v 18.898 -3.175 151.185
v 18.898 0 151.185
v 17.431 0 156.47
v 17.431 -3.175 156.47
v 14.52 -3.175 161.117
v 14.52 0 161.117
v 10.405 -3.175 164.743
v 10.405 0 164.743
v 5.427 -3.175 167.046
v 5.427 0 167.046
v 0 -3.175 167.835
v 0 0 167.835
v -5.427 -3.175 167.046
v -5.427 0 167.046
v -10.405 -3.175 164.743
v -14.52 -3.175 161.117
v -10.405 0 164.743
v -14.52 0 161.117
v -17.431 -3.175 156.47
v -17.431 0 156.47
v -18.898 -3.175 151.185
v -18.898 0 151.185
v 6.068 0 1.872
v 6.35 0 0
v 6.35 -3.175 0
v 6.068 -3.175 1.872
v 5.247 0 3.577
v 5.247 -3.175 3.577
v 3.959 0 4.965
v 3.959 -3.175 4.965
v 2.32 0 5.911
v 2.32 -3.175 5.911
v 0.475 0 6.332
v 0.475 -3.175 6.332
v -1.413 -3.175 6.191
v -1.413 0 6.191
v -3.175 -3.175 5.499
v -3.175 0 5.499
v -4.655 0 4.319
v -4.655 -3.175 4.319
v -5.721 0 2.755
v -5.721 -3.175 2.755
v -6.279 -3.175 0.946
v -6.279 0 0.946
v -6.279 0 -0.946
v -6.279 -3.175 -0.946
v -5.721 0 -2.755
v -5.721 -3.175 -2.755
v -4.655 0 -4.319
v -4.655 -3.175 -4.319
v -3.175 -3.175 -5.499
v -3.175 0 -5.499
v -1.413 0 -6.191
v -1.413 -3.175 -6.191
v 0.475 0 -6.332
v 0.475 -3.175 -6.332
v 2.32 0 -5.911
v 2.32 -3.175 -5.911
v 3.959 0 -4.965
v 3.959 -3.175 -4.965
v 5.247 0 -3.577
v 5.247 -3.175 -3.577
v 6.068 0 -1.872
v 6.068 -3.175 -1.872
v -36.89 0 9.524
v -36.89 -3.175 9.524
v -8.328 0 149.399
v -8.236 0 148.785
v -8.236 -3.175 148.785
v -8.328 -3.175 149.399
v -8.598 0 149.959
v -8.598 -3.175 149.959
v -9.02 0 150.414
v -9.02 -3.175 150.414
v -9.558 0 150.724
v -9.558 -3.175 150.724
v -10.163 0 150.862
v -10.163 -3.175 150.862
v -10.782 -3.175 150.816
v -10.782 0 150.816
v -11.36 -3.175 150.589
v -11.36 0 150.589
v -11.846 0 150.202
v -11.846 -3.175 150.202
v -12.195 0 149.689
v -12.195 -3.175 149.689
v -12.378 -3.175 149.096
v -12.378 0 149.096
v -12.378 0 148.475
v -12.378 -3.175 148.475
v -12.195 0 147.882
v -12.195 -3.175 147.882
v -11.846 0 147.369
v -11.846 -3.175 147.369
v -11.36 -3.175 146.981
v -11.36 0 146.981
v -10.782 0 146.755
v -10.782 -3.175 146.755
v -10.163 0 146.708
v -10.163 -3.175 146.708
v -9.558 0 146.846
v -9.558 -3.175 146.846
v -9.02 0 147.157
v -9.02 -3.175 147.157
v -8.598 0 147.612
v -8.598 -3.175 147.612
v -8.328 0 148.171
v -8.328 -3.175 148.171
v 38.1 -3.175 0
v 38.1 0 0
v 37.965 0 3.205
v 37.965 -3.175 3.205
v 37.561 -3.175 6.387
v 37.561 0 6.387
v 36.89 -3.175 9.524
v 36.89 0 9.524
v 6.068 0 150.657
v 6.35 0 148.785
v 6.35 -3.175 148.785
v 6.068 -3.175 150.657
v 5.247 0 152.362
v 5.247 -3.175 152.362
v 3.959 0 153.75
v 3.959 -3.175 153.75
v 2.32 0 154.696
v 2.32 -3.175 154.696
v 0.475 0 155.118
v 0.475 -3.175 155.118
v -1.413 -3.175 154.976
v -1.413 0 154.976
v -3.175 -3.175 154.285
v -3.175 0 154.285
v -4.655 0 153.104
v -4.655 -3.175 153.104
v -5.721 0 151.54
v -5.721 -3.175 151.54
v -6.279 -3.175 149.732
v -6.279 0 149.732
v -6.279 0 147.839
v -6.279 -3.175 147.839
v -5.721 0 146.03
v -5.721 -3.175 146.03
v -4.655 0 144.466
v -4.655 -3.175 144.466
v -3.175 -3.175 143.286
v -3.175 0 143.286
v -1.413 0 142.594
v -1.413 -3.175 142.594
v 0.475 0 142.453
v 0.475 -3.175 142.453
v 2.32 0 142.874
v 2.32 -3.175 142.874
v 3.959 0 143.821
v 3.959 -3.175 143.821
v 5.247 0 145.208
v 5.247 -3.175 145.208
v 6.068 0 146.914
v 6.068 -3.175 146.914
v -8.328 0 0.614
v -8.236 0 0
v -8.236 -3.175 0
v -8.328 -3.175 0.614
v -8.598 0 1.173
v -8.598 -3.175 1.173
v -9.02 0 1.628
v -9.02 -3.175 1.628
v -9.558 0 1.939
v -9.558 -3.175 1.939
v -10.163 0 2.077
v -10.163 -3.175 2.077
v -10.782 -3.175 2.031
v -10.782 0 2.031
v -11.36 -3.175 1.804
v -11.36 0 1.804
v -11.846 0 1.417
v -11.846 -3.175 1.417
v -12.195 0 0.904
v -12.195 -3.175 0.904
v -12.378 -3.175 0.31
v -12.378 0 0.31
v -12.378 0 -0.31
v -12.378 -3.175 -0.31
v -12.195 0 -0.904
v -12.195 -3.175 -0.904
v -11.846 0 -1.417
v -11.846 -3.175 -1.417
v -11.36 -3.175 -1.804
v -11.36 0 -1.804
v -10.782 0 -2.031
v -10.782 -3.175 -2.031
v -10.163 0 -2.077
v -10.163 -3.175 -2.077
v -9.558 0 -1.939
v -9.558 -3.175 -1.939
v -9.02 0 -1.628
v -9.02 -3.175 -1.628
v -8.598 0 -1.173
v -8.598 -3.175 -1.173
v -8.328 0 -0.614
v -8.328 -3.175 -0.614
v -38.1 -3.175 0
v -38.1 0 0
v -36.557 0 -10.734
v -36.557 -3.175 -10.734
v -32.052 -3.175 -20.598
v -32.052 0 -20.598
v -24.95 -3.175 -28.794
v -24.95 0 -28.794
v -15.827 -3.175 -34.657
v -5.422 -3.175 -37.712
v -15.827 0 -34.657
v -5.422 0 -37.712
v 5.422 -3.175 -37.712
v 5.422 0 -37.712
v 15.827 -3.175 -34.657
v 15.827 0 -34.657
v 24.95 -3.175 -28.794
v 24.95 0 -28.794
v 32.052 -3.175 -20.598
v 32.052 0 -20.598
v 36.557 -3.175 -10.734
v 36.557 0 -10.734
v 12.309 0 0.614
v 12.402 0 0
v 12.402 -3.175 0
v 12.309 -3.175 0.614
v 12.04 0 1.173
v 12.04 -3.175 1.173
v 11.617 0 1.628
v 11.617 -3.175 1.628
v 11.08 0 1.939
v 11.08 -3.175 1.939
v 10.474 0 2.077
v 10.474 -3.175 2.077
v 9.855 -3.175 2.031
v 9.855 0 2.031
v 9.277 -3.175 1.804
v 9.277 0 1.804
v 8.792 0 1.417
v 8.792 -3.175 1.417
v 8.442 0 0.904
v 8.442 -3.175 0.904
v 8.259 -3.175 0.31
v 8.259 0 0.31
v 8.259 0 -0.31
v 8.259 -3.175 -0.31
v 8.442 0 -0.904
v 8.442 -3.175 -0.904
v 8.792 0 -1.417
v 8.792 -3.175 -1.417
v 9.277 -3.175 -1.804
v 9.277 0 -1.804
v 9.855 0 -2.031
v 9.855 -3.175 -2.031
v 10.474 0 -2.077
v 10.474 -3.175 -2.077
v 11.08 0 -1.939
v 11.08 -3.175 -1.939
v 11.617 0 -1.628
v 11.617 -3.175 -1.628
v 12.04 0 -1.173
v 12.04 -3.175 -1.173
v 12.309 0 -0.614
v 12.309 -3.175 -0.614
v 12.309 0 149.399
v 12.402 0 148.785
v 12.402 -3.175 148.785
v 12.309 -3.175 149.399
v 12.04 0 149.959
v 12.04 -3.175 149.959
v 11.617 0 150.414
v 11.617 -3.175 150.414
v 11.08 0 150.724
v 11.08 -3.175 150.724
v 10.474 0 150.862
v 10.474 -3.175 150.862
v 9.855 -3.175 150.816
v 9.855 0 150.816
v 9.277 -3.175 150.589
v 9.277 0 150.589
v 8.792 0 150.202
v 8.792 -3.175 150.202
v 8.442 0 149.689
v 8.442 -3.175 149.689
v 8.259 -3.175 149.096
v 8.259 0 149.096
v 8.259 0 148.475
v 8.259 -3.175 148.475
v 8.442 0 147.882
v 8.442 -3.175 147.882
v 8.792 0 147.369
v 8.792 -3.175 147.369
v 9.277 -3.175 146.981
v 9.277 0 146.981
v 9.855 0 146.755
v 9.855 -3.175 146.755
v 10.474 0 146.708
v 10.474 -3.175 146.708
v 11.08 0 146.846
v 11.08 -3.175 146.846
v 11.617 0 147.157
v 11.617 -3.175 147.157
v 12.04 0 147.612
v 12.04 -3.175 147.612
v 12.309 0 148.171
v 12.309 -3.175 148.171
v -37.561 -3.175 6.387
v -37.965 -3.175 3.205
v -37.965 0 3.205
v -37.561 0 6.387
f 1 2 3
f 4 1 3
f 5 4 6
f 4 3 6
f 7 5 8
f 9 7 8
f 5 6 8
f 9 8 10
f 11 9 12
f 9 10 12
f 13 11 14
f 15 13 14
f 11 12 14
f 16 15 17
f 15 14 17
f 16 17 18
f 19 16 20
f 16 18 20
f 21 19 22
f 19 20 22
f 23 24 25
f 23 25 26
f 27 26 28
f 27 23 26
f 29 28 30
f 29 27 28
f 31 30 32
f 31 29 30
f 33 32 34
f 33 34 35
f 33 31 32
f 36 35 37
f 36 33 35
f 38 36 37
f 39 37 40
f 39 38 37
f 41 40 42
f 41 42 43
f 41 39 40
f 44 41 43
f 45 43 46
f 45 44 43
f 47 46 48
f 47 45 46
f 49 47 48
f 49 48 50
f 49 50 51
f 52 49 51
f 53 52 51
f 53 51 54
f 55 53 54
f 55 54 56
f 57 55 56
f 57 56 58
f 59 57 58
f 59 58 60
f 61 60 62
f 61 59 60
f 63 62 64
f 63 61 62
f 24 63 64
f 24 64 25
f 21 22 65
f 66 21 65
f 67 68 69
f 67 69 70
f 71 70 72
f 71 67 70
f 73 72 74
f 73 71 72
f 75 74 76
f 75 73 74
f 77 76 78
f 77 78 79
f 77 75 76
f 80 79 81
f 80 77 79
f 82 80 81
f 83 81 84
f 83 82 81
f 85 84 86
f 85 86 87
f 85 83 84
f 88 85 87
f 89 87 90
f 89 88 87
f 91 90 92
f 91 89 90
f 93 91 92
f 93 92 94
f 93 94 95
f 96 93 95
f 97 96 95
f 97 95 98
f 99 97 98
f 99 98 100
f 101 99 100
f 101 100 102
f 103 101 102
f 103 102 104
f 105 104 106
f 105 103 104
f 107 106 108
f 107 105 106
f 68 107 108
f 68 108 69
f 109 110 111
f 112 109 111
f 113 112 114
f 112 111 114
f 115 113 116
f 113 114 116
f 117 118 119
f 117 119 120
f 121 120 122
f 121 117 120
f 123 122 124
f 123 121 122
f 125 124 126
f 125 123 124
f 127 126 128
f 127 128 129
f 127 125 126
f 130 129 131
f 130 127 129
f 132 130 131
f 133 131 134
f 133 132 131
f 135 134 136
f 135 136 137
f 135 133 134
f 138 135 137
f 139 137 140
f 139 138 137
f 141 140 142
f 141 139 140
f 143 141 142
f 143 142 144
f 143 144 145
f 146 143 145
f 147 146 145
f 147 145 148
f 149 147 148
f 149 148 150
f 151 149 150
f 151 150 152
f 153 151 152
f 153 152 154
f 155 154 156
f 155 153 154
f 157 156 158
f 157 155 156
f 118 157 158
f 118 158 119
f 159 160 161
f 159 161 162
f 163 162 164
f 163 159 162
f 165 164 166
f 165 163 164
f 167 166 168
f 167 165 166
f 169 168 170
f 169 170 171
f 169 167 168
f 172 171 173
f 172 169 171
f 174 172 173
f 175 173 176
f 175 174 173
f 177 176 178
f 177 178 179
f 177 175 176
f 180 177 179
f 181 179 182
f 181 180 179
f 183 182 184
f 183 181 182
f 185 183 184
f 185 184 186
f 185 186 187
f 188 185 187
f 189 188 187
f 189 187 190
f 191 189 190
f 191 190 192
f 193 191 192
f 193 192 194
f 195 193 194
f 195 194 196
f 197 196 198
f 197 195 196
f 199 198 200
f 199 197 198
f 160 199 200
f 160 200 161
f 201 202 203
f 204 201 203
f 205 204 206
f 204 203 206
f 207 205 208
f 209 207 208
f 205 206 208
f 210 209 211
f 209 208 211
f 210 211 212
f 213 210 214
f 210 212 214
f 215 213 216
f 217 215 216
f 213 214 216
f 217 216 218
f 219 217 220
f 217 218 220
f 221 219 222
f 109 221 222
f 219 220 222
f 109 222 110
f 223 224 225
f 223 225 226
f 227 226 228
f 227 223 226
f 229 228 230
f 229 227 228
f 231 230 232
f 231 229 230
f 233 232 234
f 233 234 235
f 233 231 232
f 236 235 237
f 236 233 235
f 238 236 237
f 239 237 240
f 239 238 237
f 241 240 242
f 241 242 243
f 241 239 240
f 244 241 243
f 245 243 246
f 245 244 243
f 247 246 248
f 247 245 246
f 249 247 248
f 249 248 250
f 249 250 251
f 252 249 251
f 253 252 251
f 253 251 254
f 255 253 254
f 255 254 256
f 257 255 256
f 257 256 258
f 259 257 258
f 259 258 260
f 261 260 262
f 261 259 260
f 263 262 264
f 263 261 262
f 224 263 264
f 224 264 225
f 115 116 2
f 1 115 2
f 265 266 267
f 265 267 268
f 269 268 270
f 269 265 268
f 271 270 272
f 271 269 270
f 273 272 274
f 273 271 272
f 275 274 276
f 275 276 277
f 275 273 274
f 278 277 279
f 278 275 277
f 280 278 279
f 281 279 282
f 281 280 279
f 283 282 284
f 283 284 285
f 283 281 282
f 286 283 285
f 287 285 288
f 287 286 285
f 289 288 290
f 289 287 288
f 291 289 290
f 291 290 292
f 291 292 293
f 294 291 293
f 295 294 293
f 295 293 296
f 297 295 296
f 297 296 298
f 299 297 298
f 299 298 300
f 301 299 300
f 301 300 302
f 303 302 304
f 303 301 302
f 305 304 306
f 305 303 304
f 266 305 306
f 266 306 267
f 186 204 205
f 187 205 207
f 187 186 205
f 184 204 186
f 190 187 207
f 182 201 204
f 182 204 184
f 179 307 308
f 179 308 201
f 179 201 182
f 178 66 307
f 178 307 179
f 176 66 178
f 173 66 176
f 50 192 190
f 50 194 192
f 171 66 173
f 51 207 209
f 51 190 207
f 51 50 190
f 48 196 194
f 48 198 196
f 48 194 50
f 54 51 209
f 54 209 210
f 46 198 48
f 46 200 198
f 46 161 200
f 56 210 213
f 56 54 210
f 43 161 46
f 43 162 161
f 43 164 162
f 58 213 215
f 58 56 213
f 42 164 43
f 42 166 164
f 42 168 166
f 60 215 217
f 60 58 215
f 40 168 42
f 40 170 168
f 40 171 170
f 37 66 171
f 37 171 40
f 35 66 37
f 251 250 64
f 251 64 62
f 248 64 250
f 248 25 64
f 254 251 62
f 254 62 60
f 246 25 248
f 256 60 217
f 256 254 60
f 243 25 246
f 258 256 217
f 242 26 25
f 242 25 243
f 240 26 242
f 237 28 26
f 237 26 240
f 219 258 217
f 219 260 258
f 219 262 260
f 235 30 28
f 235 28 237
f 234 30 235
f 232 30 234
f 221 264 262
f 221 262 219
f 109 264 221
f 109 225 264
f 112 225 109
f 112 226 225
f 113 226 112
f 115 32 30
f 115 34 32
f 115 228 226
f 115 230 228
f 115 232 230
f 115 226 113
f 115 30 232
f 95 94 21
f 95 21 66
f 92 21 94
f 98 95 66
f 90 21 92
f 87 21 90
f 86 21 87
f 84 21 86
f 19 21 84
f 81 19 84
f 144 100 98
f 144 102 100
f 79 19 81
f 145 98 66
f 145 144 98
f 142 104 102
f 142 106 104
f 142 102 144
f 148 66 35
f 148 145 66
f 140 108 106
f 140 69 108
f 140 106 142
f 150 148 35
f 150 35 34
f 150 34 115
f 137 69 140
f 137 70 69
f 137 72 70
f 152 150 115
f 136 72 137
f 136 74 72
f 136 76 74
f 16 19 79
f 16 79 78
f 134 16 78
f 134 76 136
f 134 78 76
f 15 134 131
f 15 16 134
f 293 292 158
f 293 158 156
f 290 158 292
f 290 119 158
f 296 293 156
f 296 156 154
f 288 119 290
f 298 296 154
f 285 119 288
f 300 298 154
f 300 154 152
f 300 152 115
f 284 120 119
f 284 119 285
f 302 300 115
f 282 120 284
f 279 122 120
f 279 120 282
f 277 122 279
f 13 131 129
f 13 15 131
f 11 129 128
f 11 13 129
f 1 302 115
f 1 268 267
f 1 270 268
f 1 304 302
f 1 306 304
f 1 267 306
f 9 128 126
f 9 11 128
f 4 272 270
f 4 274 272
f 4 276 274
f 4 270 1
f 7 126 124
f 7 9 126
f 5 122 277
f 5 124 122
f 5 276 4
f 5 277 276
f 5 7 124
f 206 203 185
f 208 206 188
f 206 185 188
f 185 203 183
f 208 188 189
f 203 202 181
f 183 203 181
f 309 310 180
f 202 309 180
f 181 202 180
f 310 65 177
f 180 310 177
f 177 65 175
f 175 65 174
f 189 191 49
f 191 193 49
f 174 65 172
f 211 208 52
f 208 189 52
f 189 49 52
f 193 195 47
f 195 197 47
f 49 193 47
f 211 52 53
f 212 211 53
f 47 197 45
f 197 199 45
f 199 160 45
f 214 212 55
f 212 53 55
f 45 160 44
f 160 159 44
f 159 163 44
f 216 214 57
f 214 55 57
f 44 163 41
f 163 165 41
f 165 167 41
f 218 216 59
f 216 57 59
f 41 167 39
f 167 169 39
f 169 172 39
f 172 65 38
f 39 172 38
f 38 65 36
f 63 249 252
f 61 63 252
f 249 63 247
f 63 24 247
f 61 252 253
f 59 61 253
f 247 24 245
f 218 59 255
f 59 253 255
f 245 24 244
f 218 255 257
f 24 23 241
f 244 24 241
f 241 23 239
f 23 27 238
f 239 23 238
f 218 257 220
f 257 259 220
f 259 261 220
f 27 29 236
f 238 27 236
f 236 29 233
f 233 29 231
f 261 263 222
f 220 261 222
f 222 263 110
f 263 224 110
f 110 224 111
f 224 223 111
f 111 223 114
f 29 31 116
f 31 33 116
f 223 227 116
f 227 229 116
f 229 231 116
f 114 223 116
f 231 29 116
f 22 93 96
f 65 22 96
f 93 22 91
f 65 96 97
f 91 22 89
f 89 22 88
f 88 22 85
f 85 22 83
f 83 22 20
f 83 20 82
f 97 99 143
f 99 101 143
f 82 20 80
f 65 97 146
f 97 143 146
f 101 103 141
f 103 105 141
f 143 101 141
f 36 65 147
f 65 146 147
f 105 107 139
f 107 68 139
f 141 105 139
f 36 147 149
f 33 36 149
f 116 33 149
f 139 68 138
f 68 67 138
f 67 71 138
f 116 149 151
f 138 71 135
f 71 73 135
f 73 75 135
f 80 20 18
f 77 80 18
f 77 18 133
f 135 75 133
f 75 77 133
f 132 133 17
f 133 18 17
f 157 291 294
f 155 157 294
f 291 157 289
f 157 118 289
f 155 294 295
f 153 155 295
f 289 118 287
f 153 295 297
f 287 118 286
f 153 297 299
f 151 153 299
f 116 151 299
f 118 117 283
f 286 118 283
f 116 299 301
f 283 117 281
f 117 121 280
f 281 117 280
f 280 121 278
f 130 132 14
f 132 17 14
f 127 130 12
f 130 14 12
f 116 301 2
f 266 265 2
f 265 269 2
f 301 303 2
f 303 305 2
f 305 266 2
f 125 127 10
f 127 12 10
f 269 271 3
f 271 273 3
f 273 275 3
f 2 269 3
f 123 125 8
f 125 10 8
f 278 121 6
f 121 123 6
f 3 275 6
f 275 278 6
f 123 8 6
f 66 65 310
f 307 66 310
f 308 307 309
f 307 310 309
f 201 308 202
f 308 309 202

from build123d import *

# Parameters (mm, degrees)
F0_R     = 2.0828
F0_R_2   = 6.35
F1_DEPTH = 3.175


with BuildPart() as f1:
    # F0 (on Front) → F1 (new body)
    with BuildSketch(Plane.XZ):
        with BuildLine():
            Line((-36.890323, 9.524395), (-38.1, 0))
            ThreePointArc((-38.1, 0), (0, -38.1), (38.1, 0))
            Line((38.1, 0), (36.890323, 9.524395))
            ThreePointArc((36.890323, 9.524395), (0, 38.1), (-36.890323, 9.524395))
        make_face()
        with Locations((-10.31875, 0)):
            Circle(F0_R, mode=Mode.SUBTRACT)
        Circle(F0_R_2, mode=Mode.SUBTRACT)
        with Locations((10.31875, 0)):
            Circle(F0_R, mode=Mode.SUBTRACT)
        with BuildLine():
            ThreePointArc((-36.890323, 9.524395), (-37.796371, 4.800454), (-38.1, 0))
            Line((-38.1, 0), (-36.890323, 9.524395))
        make_face()
        with BuildLine():
            Line((36.890323, 9.524395), (38.1, 0))
            ThreePointArc((38.1, 0), (37.796371, 4.800454), (36.890323, 9.524395))
        make_face()
        with BuildLine():
            Line((-18.898185, 151.185483), (-36.890323, 9.524395))
            ThreePointArc((-36.890323, 9.524395), (0, 38.1), (36.890323, 9.524395))
            Line((36.890323, 9.524395), (18.898185, 151.185483))
            ThreePointArc((18.898185, 151.185483), (19.012008, 149.987768), (19.05, 148.785256))
            ThreePointArc((19.05, 148.785256), (-1.202512, 129.773248), (-18.898185, 151.185483))
        make_face()
        with BuildLine():
            ThreePointArc((18.898185, 151.185483), (0, 167.835256), (-18.898185, 151.185483))
            ThreePointArc((-18.898185, 151.185483), (-1.202512, 129.773248), (19.05, 148.785256))
            ThreePointArc((19.05, 148.785256), (19.012008, 149.987768), (18.898185, 151.185483))
        make_face()
        with Locations((-10.31875, 148.785256)):
            Circle(F0_R, mode=Mode.SUBTRACT)
        with Locations((0, 148.785256)):
            Circle(F0_R_2, mode=Mode.SUBTRACT)
        with Locations((10.31875, 148.785256)):
            Circle(F0_R, mode=Mode.SUBTRACT)
    extrude(amount=F1_DEPTH)


solid = f1.part
